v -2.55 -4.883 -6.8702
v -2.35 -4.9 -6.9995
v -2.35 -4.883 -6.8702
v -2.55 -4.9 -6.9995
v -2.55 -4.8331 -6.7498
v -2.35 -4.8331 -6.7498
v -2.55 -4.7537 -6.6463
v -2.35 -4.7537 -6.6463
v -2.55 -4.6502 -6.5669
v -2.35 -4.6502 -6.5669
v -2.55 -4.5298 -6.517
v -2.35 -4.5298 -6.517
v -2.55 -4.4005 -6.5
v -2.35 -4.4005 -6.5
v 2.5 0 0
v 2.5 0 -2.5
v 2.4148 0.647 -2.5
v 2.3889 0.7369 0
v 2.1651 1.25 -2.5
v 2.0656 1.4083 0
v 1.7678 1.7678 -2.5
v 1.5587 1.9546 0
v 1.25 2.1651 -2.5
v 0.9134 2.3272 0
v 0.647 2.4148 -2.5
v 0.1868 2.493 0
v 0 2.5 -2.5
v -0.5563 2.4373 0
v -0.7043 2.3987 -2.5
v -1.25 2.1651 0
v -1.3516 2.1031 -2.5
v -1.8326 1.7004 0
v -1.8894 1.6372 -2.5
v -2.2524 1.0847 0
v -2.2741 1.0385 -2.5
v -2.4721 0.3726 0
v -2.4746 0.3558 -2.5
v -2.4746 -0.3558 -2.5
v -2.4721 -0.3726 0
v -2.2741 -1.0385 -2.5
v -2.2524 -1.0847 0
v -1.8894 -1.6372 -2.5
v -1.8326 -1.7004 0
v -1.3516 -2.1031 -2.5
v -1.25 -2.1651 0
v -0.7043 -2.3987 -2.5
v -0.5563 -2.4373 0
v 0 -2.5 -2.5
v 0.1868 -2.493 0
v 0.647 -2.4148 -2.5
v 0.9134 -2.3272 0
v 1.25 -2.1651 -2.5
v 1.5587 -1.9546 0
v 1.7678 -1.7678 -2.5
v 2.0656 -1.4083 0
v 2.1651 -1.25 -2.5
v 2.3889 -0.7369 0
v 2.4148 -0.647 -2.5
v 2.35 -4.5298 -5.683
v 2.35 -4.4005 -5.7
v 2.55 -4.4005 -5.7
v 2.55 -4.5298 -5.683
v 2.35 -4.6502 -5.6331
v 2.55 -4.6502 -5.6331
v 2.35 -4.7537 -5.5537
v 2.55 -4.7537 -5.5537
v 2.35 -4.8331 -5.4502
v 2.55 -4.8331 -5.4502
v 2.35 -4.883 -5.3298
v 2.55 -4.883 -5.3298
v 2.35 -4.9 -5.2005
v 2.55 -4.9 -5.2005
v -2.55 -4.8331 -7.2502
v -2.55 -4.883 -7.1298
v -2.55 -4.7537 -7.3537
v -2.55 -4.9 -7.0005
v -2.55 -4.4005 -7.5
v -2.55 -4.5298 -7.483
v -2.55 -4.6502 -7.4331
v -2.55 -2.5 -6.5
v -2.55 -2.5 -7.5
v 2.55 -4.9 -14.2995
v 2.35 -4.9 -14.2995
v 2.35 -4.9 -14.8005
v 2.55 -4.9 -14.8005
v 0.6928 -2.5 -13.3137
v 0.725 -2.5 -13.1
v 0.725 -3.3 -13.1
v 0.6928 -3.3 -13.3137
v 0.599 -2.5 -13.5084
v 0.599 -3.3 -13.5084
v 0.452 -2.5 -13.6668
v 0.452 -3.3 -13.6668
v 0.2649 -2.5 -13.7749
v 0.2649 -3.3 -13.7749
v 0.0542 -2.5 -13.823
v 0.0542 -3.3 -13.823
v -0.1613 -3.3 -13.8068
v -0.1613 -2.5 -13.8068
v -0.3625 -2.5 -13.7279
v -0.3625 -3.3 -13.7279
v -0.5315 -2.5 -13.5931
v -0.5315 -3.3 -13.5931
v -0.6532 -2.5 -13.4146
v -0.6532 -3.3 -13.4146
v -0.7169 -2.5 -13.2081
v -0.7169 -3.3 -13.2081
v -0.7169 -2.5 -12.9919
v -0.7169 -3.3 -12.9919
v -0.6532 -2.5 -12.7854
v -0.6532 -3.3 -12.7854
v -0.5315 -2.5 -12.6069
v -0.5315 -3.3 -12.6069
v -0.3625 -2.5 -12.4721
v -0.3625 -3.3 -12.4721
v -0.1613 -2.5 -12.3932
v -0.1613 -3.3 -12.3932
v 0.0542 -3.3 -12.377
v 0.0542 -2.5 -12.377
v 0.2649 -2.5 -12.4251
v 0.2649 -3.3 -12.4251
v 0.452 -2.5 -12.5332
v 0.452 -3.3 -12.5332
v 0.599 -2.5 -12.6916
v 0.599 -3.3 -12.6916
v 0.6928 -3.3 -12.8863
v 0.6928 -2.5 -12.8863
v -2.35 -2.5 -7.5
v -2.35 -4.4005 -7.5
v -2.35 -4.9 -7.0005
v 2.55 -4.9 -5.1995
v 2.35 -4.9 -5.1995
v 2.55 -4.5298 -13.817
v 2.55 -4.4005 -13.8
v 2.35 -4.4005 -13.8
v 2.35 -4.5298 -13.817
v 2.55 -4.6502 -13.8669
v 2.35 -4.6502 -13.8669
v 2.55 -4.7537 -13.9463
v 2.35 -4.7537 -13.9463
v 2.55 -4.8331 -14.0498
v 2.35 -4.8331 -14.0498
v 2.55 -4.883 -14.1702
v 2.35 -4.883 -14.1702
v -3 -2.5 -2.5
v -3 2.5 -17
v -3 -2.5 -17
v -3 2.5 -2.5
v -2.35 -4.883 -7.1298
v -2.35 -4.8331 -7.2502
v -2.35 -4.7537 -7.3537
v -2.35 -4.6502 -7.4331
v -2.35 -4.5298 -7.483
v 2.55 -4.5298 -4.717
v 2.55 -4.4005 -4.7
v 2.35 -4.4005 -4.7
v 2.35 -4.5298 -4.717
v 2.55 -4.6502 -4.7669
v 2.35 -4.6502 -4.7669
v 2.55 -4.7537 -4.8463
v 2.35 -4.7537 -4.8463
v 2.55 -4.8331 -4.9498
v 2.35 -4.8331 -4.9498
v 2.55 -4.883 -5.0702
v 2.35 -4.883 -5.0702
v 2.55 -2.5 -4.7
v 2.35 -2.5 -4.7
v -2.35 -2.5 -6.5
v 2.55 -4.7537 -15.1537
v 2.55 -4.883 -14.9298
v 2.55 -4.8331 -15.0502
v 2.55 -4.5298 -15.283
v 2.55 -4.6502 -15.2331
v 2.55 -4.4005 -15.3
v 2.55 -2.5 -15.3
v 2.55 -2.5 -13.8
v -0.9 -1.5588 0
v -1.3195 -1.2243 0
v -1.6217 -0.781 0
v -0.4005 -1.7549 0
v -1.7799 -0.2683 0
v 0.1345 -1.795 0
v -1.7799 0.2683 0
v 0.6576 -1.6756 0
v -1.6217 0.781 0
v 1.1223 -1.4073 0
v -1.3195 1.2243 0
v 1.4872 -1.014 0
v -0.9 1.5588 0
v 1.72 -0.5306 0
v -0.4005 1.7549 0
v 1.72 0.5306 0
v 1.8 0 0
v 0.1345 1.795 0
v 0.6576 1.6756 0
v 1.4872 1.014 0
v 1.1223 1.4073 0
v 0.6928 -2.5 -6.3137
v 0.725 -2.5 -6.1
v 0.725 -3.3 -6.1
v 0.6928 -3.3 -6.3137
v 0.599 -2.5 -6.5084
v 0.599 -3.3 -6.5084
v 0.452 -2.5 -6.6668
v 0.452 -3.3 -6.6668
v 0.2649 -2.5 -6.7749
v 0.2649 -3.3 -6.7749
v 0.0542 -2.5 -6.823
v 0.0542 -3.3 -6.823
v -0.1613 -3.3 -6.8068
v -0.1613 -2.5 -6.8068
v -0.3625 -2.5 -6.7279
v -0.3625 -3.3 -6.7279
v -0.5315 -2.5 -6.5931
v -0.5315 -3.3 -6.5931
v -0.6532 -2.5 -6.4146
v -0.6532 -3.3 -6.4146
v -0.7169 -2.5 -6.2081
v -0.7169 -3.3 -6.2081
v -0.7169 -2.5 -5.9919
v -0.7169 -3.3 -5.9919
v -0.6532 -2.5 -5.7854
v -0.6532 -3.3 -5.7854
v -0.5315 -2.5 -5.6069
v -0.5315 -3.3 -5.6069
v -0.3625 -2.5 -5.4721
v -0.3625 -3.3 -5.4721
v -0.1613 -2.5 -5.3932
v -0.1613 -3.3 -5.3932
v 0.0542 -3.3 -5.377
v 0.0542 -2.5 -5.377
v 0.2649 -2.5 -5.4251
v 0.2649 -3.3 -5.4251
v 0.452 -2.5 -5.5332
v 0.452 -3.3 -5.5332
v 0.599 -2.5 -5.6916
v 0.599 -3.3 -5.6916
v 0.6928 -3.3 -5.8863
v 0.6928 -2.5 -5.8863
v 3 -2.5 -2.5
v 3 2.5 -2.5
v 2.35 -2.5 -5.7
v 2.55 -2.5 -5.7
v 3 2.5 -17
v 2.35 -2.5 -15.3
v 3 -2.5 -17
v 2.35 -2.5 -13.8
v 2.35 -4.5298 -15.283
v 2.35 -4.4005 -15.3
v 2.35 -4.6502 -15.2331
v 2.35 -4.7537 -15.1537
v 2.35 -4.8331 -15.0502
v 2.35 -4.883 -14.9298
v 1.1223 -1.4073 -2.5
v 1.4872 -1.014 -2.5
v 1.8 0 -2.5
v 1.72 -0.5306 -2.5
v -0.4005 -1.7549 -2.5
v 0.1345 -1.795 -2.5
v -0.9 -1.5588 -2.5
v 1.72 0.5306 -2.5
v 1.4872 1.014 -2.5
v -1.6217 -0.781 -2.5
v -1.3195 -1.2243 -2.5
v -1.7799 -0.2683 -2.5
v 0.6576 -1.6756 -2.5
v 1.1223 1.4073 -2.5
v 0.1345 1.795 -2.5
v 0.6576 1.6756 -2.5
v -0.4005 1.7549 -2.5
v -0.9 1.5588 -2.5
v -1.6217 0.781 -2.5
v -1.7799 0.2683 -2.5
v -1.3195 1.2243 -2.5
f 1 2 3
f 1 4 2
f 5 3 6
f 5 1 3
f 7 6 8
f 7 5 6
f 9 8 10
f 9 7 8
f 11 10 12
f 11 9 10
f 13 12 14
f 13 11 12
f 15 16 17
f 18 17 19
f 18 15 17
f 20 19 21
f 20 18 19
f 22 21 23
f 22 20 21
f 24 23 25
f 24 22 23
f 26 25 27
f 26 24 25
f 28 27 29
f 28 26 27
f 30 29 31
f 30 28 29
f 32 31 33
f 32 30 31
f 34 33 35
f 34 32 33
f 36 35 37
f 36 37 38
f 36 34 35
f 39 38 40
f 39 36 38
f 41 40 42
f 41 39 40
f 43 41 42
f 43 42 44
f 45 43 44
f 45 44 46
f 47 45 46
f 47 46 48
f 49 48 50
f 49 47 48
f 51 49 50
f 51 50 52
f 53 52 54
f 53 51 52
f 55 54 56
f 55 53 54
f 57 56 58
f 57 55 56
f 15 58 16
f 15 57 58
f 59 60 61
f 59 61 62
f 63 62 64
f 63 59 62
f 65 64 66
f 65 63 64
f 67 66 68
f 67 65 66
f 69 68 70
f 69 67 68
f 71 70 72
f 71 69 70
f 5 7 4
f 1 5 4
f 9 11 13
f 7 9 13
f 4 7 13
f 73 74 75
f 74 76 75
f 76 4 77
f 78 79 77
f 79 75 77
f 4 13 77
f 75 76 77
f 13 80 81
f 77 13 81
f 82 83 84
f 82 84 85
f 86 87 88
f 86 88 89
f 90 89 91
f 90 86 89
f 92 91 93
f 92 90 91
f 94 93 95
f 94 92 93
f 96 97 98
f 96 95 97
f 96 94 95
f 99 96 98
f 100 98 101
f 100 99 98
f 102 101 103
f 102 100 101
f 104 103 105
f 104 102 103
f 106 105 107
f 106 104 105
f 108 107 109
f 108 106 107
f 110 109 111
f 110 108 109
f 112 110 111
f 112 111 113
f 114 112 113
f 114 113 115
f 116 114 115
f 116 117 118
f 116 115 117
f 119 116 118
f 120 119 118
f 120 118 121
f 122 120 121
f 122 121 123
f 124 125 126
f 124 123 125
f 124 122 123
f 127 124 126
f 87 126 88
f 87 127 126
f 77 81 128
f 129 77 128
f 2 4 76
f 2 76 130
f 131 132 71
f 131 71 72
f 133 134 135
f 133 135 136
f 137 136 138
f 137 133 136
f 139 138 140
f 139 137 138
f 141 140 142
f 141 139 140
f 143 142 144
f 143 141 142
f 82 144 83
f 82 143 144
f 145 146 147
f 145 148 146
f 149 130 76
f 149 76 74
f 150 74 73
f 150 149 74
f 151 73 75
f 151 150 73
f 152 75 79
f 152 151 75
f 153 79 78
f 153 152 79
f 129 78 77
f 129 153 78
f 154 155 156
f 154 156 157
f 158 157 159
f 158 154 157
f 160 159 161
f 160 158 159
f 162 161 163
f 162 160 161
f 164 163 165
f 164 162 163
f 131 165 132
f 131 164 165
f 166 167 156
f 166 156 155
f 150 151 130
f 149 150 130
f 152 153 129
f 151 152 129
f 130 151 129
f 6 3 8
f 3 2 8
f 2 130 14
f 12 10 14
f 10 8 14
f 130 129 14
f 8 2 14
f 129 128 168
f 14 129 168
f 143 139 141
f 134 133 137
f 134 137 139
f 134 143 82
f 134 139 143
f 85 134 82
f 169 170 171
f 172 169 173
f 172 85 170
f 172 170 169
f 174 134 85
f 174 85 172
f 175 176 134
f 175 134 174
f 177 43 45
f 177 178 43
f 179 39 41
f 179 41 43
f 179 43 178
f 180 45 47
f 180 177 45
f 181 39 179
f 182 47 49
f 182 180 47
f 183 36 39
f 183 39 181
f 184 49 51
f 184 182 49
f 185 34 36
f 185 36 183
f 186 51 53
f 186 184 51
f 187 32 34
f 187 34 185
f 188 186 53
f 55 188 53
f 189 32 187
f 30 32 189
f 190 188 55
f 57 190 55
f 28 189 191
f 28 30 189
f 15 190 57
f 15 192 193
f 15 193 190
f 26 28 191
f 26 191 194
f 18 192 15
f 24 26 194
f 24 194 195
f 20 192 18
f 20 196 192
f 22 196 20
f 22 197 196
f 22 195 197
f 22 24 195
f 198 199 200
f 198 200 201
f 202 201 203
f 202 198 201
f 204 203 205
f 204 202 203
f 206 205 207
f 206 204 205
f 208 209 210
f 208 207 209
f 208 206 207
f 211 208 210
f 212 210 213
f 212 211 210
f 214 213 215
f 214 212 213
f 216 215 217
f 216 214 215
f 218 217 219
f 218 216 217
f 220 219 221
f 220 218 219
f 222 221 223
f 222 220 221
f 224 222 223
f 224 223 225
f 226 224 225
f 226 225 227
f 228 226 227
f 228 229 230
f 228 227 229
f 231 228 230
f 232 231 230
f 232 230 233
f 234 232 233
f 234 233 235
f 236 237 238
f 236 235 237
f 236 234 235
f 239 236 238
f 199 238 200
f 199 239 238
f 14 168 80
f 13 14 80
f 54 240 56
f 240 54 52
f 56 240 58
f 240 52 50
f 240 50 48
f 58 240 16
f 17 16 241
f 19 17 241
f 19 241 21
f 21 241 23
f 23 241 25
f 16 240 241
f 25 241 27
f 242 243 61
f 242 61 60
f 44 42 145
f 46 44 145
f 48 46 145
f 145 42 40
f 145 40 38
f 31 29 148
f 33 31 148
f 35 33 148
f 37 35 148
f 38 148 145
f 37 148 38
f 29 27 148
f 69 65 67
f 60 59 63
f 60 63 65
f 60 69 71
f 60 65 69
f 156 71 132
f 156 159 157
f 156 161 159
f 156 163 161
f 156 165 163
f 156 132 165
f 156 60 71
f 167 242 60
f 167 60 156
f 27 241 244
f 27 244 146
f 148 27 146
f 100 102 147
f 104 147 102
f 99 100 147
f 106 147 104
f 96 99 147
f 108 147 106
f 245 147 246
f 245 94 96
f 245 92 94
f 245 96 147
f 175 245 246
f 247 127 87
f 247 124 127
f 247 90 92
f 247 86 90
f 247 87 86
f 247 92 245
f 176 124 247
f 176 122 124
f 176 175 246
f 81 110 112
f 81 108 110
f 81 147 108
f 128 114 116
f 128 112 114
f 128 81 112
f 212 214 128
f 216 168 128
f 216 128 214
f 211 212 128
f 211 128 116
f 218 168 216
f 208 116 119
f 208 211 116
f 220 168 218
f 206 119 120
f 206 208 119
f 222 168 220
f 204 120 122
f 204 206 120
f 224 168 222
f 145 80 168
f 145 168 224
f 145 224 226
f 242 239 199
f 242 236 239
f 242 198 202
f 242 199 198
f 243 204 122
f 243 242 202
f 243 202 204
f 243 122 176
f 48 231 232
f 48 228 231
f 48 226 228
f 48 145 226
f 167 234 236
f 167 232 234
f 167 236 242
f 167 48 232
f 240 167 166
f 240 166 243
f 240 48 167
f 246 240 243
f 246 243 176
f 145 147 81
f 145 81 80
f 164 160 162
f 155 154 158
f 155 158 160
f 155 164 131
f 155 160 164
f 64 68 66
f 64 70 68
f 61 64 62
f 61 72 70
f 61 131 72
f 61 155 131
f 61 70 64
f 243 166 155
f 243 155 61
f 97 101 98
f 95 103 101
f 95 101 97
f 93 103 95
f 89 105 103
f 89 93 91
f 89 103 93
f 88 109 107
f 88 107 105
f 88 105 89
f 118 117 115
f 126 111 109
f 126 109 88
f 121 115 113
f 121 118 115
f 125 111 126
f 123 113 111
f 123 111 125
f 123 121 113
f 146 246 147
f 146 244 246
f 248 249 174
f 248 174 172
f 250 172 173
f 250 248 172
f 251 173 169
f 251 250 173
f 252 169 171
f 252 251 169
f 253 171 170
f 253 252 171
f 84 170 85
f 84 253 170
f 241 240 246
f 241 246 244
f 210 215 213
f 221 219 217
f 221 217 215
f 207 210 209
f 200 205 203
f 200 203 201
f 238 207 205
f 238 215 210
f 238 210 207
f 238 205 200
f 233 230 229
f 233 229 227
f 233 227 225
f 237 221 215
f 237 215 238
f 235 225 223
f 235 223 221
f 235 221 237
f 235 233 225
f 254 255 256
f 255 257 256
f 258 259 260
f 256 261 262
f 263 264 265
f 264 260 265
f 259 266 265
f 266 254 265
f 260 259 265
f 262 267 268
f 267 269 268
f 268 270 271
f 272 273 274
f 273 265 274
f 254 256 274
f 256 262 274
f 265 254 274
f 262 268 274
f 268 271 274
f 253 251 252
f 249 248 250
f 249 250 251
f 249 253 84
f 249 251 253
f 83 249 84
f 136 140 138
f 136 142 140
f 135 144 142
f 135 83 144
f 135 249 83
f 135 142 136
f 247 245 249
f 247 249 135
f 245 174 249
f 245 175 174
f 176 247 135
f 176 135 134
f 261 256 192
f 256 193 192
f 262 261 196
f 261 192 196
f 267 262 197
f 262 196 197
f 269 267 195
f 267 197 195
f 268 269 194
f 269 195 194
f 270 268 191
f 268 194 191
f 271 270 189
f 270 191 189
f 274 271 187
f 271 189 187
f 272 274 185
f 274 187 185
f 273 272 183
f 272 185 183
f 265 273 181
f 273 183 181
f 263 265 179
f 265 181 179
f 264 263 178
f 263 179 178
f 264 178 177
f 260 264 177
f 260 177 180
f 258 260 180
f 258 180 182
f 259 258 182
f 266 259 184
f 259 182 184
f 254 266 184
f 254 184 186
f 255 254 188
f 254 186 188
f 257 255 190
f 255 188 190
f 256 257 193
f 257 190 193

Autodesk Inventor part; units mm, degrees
ref_plane "YZ Plane" through (0, 0, 0) normal (1, 0, 0) x (0, 1, 0)
ref_plane "XZ Plane" through (0, 0, 0) normal (0, 1, 0) x (-1, 0, 0)
ref_plane "XY Plane" through (0, 0, 0) normal (0, 0, 1) x (1, 0, 0)
sketch "スケッチ1" plane through (0, 0, 0) normal (0, 0, 1) x (1, 0, 0)
  circle A0 centre (0, 0) radius 2.5
  circle A1 centre (0, 0) radius 1.8
  dimension "d0" = 5
  dimension "d1" = 3.6
extrude "押し出し1" add sketch "スケッチ1" against normal blind 2.5
sketch "スケッチ2" plane through (0, 0, -2.5) normal (0, 0, -1) x (-1, 0, 0)
  line L0 (-3, 2.5) -> (3, 2.5)
  line L1 (3, 2.5) -> (3, -2.5)
  line L2 (3, -2.5) -> (-3, -2.5)
  line L3 (-3, -2.5) -> (-3, 2.5)
  point P0 (0, 0)
  dimension "d4" = 2.5
  dimension "d5" = 5
  dimension "d6" = 3
  dimension "d7" = 6
extrude "押し出し2" add sketch "スケッチ2" along normal blind 14.5
sketch "スケッチ3" plane through (-3, -2.5, -2.5) normal (0, -1, 0) x (1, 0, 0)
  circle A0 centre (3, -3.6) radius 0.725
  line L0 (3, 0) -> (6, 0) projected
  circle A1 centre (3, -10.6) radius 0.725
  point P0 (3, 2.5)
  dimension "d10" = 1.45
  dimension "d11" = 3.6
  dimension "d12" = 1.45
  dimension "d13" = 7
extrude "押し出し3" add sketch "スケッチ3" along normal blind 0.8
sketch "スケッチ4" plane through (-3, -2.5, -2.5) normal (0, -1, 0) x (1, 0, 0)
  line L0 (5.35, -2.2) -> (5.55, -2.2)
  line L1 (5.55, -2.2) -> (5.55, -3.2)
  line L2 (5.55, -3.2) -> (5.35, -3.2)
  line L3 (5.35, -3.2) -> (5.35, -2.2)
  line L4 (0.65, -4) -> (0.45, -4)
  line L5 (0.45, -4) -> (0.45, -5)
  line L6 (0.45, -5) -> (0.65, -5)
  line L7 (0.65, -5) -> (0.65, -4)
  circle A0 centre (3, -3.6) radius 0.725 projected
  point P0 (3, 2.5)
  dimension "d16" = 0.2
  dimension "d17" = 0.2
  dimension "d18" = 2.55
  dimension "d19" = 2.55
  dimension "d20" = 1.4
  dimension "d21" = 1.4
  dimension "d22" = 1
  dimension "d23" = 1
extrude "押し出し4" add sketch "スケッチ4" along normal blind 2.4 contours L0 L1 L2 L3 | L7 L6 L5 L4
sketch "スケッチ5" plane through (-3, -2.5, -2.5) normal (0, -1, 0) x (1, 0, 0)
  circle A0 centre (3, -10.6) radius 0.725 projected
  line L0 (5.55, -2.2) -> (5.55, -3.2) projected
  line L1 (5.55, -3.2) -> (5.35, -3.2) projected
  line L2 (5.35, -3.2) -> (5.35, -2.2) projected
  line L3 (5.35, -2.2) -> (5.55, -2.2) projected
  line L4 (0.65, -4) -> (0.65, -5) projected
  line L5 (0.65, -5) -> (0.45, -5) projected
  line L6 (0.45, -5) -> (0.45, -4) projected
  line L7 (0.45, -4) -> (0.65, -4) projected
  circle A1 centre (3, -3.6) radius 0.725 projected
  circle A2 centre (3, -10.6) radius 0.725 projected
  line L8 (0, 0) -> (3, 0) projected
  line L9 (0, 0) -> (0, -14.5) projected
  line L10 (6, -14.5) -> (0, -14.5) projected
  line L11 (6, 0) -> (6, -14.5) projected
  line L12 (3, 0) -> (6, 0) projected
  line L13 (5.35, -11.3) -> (5.55, -11.3)
  line L14 (5.55, -11.3) -> (5.55, -12.8)
  line L15 (5.55, -12.8) -> (5.35, -12.8)
  line L16 (5.35, -12.8) -> (5.35, -11.3)
  point P0 (3, 2.5)
  dimension "d26" = 0.2
  dimension "d27" = 1.5
  dimension "d28" = 2.2
  dimension "d29" = 2.55
extrude "押し出し5" add sketch "スケッチ5" along normal blind 2.4 contours L13 L14 L15 L16
fillet "フィレット1" radius 0.5 6 edges at (2.45, -4.9, -5.7) (2.45, -4.9, -4.7) (-2.45, -4.9, -6.5) (-2.45, -4.9, -7.5) (2.45, -4.9, -13.8) (2.45, -4.9, -15.3)
properties part number "MJ-4535-3" material "ABS プラスチック"
